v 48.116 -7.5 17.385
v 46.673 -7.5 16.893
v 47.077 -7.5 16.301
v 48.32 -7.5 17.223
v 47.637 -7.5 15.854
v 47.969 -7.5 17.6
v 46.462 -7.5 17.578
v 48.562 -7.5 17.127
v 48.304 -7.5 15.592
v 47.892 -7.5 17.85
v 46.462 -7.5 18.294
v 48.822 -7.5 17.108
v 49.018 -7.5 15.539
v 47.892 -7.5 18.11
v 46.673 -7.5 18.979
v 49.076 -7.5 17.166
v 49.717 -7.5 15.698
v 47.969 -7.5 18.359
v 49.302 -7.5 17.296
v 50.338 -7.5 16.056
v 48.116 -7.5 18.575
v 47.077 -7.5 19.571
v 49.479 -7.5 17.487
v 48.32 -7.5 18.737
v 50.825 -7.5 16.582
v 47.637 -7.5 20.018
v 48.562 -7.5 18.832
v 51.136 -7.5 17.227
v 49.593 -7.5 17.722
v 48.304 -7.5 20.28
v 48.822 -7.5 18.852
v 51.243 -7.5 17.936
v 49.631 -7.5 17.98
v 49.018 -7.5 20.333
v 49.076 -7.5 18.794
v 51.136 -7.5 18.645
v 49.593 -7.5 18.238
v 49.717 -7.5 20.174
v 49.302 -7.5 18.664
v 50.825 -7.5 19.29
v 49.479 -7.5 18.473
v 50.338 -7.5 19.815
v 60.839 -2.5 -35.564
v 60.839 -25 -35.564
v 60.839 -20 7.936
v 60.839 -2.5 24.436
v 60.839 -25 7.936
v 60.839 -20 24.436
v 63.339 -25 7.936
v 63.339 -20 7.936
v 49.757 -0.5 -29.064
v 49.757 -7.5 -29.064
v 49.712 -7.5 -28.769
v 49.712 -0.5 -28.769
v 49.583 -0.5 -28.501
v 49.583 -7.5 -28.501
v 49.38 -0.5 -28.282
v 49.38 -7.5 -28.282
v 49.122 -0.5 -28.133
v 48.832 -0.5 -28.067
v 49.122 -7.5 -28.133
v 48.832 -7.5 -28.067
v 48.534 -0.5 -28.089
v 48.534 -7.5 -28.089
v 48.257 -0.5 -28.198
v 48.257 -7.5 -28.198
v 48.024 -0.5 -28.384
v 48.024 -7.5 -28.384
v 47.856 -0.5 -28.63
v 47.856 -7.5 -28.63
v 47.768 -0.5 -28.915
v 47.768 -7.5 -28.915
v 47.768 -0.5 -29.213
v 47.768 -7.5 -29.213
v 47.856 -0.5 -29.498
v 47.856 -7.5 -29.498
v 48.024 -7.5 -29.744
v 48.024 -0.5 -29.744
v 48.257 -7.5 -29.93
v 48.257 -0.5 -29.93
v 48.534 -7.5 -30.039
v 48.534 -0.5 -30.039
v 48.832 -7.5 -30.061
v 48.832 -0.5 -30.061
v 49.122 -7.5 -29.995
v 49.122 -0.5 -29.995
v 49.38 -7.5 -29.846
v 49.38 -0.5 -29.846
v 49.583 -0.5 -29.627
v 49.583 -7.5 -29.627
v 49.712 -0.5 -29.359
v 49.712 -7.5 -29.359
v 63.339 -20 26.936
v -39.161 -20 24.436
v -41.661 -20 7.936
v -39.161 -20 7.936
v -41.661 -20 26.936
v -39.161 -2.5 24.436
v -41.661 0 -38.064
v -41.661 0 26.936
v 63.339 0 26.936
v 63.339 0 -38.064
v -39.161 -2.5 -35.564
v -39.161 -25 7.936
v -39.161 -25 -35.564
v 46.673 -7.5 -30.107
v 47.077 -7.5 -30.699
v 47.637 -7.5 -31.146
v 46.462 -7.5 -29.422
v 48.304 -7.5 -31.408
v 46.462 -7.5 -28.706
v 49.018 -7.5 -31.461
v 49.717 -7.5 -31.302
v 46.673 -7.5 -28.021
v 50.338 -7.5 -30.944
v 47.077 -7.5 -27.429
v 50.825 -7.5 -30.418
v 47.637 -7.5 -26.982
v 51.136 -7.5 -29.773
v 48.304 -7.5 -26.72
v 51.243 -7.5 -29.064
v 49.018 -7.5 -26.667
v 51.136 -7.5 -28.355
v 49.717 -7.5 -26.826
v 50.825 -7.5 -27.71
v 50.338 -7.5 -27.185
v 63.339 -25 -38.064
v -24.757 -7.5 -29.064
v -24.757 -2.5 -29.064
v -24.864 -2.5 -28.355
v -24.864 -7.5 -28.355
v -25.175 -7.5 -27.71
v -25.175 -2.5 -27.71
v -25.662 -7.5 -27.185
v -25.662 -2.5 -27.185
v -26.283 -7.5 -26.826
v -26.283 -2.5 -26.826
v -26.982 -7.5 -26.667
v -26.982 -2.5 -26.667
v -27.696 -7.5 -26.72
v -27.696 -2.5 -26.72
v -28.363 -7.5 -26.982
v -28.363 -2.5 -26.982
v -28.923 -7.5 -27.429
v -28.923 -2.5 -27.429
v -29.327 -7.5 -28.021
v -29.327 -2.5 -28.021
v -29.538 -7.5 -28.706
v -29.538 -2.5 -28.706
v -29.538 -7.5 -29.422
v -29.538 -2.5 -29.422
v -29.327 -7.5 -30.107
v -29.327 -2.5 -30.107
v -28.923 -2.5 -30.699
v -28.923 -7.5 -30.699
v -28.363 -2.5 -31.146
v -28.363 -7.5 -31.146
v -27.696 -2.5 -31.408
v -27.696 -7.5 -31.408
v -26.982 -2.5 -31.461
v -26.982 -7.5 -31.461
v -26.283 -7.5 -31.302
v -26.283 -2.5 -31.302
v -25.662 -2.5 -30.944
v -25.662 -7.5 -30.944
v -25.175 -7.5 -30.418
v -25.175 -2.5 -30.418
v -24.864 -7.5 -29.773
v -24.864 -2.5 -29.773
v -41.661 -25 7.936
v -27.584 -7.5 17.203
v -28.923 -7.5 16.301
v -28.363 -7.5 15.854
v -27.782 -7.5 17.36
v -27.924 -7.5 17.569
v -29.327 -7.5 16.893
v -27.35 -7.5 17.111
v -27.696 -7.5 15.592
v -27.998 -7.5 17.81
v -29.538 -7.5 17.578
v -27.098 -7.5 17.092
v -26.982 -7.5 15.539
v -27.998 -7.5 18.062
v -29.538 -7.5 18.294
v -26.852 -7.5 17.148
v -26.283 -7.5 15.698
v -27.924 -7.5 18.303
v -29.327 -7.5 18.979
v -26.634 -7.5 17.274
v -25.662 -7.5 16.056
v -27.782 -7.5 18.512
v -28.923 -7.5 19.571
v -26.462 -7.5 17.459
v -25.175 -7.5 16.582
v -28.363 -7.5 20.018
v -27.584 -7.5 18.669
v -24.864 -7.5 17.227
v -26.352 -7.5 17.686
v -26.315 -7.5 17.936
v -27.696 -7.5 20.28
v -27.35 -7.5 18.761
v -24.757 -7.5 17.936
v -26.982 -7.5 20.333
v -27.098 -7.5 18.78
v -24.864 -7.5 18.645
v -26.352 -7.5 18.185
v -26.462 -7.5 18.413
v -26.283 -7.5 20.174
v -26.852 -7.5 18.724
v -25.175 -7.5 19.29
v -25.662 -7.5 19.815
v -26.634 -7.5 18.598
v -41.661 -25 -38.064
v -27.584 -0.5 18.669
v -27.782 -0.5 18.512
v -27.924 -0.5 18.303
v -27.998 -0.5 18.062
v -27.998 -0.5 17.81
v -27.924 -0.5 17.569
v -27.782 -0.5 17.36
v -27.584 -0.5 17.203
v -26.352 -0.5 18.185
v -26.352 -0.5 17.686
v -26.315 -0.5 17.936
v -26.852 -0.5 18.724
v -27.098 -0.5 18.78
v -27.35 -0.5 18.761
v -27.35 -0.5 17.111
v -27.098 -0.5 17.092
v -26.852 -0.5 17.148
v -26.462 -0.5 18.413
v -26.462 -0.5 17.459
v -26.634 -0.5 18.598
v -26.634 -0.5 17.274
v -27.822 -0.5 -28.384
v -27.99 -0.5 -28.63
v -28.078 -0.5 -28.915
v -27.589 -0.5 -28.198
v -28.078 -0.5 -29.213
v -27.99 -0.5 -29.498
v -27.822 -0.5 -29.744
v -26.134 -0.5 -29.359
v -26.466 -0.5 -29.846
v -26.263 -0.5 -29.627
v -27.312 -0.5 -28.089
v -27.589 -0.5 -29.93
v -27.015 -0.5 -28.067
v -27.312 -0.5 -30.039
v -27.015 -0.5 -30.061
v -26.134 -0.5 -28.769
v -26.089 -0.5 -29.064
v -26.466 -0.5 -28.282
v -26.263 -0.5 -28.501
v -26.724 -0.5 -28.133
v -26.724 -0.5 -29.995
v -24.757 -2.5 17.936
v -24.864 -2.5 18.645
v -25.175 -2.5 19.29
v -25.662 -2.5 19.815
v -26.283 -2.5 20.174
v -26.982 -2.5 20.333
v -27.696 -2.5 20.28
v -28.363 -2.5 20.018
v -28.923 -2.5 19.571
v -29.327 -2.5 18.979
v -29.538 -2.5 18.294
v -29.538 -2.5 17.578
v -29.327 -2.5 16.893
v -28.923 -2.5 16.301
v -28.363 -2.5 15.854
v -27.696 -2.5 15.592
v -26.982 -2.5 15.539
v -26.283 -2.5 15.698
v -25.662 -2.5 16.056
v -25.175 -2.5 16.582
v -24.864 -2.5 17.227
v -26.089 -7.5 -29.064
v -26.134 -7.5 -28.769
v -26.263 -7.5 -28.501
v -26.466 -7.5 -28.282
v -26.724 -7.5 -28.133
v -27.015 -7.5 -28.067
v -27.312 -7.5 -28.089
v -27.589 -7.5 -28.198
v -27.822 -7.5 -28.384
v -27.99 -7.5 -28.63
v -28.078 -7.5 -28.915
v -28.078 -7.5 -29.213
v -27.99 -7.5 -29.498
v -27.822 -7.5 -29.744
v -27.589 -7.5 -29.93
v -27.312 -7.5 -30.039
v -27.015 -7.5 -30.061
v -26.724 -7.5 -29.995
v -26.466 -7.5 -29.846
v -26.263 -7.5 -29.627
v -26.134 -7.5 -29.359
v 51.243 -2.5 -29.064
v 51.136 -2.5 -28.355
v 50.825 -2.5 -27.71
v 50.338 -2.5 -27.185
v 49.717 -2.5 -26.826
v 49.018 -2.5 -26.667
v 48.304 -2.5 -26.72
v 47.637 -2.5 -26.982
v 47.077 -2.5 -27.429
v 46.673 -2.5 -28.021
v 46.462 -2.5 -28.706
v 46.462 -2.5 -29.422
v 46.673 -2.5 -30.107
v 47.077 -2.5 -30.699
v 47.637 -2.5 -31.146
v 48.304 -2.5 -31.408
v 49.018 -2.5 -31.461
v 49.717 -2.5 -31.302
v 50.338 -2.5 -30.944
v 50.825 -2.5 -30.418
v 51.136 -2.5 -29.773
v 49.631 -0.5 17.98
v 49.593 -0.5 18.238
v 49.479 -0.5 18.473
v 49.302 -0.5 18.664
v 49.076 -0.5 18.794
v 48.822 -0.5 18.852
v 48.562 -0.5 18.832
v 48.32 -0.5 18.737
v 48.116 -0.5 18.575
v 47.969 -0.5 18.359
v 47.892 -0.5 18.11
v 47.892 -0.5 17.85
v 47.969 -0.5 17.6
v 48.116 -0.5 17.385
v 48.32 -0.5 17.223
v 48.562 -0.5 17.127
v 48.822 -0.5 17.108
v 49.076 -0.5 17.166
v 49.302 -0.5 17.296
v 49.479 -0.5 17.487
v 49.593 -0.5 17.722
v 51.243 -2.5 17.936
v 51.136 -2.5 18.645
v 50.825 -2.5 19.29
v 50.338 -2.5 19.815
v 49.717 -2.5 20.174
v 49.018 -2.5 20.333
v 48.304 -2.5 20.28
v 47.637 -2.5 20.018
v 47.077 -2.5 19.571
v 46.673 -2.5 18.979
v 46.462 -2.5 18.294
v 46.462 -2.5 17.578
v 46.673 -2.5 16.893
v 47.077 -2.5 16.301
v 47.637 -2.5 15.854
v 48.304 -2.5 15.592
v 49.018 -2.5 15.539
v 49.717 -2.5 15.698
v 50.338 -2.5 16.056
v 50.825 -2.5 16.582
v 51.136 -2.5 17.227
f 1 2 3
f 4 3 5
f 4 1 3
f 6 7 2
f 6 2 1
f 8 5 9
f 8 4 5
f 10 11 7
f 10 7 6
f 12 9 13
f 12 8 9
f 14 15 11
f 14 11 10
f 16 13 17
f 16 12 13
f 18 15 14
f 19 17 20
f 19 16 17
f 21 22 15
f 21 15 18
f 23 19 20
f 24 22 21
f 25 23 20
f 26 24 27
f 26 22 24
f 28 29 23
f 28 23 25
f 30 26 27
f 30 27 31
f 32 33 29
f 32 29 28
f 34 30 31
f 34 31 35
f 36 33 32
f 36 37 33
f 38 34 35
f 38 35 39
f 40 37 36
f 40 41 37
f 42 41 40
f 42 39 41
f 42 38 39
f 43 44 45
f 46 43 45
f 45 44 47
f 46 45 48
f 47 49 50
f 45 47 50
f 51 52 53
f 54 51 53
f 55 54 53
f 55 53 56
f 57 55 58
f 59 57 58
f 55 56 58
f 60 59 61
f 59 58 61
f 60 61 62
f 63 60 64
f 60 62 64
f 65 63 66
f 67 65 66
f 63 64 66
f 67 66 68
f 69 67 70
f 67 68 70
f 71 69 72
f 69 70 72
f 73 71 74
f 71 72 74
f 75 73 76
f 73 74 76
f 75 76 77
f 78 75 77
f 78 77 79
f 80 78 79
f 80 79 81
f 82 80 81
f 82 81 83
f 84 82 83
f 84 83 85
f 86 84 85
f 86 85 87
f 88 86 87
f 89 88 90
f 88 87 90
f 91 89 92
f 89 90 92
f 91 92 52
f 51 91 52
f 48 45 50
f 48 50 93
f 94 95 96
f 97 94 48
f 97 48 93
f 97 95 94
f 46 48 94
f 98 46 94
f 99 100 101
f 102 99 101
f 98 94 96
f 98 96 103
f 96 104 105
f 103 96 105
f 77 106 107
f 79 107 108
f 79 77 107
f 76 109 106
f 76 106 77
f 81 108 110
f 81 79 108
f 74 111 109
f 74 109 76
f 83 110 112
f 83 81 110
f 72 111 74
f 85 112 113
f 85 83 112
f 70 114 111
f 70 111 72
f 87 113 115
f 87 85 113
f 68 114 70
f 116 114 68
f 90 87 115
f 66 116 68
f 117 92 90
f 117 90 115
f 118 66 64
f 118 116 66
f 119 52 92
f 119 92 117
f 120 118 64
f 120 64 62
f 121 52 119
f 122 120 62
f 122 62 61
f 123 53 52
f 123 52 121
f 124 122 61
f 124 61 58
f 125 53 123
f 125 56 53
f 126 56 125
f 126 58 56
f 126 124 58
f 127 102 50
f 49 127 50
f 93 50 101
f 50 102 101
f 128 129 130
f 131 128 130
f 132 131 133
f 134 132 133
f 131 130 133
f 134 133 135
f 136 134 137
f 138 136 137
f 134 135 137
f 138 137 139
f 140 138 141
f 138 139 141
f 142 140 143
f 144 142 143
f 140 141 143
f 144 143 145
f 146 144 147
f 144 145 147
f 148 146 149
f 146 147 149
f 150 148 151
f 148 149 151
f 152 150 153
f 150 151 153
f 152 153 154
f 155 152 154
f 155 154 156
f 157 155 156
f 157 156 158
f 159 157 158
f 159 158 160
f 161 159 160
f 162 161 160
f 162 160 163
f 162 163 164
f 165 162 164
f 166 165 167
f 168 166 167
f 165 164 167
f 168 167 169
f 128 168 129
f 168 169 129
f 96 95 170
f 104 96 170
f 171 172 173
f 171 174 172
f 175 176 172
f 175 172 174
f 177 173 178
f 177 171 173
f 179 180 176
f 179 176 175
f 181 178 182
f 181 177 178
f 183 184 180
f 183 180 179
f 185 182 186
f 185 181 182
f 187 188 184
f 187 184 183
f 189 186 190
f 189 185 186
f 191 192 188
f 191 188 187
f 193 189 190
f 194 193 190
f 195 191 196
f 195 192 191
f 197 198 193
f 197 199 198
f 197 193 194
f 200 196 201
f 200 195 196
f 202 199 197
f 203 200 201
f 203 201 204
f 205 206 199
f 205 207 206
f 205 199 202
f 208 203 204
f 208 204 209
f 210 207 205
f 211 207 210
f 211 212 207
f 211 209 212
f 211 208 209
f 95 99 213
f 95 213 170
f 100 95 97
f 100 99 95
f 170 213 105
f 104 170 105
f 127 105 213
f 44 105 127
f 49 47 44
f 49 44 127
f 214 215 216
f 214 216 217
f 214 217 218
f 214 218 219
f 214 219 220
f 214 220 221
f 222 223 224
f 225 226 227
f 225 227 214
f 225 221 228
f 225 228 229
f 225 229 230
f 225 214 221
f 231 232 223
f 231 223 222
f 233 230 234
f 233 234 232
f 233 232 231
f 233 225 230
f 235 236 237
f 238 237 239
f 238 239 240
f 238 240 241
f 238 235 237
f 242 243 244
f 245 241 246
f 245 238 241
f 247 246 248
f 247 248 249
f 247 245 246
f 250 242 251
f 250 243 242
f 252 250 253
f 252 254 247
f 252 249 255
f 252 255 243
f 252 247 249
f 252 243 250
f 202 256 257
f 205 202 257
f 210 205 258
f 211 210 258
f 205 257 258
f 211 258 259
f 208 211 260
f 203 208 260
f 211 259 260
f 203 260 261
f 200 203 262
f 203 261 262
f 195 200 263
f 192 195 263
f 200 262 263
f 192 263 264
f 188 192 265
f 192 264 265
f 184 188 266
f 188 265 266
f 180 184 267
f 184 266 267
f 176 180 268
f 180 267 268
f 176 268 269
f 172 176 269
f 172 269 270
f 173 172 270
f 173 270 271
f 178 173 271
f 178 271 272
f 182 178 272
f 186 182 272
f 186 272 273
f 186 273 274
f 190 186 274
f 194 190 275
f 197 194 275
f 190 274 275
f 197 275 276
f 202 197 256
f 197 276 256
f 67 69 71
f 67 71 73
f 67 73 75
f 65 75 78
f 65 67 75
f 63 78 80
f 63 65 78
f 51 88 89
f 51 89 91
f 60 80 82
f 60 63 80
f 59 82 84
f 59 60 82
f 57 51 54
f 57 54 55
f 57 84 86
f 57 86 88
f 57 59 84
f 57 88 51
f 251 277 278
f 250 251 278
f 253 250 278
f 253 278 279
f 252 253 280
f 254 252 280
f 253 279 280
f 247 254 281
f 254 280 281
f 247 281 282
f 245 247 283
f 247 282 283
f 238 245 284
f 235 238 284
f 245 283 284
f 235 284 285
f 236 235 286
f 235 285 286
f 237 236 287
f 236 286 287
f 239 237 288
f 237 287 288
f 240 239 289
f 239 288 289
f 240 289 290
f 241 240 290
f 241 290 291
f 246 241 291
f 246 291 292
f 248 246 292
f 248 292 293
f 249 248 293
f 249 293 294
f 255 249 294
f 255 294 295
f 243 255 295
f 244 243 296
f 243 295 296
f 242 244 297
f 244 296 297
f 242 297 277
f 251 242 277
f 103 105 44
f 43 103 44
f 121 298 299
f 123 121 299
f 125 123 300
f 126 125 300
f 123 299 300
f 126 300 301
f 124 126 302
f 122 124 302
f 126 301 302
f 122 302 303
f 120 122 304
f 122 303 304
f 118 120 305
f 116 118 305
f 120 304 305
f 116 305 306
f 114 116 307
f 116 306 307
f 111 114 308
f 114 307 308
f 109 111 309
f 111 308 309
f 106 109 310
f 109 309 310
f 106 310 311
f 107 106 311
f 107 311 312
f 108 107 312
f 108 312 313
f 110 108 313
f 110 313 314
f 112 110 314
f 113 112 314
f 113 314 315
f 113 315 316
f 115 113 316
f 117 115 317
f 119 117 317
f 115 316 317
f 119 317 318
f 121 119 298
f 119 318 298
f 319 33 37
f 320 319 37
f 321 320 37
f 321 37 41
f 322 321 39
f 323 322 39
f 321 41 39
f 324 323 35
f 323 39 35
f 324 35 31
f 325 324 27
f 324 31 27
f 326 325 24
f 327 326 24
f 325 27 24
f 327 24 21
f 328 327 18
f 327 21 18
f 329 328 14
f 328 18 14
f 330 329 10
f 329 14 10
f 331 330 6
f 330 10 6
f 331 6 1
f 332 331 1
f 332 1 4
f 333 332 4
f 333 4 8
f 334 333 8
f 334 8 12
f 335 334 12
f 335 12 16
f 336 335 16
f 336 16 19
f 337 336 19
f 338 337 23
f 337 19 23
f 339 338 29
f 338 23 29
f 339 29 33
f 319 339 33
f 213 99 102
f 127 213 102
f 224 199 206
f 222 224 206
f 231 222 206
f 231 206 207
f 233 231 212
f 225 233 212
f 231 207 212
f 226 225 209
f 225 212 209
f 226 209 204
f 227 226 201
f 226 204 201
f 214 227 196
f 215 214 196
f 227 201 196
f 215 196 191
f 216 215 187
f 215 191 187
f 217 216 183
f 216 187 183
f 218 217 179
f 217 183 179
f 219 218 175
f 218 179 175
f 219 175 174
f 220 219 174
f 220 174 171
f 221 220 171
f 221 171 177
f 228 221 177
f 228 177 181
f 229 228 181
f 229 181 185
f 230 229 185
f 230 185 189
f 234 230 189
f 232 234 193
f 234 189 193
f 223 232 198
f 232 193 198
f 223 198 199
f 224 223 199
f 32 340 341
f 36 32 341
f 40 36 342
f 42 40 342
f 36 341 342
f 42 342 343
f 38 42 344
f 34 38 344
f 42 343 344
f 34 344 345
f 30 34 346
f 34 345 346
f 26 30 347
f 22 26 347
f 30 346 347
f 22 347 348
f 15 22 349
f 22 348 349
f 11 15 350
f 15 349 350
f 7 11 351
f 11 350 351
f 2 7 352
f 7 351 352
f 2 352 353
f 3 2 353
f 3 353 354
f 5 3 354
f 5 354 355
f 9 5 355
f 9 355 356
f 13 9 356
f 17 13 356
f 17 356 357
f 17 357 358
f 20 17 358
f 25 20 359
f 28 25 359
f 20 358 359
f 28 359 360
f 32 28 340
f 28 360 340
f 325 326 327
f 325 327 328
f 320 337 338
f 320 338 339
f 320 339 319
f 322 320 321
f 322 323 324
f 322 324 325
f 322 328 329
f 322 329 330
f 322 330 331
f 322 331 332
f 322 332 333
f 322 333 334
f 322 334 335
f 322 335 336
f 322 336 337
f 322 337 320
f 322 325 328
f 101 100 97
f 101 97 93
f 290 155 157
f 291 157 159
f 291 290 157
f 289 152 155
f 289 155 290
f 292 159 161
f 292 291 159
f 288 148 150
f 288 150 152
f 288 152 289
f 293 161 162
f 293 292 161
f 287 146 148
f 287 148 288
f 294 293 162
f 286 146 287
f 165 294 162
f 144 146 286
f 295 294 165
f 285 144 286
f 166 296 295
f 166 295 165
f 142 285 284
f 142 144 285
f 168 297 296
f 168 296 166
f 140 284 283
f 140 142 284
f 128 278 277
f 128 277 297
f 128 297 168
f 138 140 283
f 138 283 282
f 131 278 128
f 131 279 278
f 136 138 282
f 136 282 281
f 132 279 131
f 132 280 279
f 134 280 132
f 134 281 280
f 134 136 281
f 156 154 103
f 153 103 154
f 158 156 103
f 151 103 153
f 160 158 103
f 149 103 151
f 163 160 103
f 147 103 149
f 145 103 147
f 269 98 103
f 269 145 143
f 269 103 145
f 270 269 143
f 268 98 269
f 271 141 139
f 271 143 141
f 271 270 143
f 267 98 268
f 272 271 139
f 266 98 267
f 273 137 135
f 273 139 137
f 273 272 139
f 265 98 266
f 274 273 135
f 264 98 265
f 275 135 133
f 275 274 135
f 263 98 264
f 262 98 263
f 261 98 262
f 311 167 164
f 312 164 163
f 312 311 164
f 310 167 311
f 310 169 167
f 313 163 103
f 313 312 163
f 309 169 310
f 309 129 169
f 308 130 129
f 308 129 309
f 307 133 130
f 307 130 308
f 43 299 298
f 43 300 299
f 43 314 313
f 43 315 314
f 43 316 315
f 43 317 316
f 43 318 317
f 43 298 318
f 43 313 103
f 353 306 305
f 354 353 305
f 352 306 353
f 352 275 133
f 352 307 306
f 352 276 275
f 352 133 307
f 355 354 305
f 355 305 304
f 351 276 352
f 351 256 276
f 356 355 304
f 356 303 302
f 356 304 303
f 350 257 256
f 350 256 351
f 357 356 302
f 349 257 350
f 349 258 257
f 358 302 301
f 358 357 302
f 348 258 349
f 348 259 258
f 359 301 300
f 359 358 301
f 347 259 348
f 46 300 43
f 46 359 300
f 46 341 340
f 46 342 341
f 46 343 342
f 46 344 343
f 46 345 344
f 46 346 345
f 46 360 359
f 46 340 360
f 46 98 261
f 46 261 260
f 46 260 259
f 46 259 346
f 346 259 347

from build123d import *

# Parameters (mm, degrees)
F0_W      = 105
F0_H      = 65
F1_DEPTH  = 25
F3_DEPTH  = 22.5
F4_W      = 5
F4_H      = 19
F5_DEPTH  = 2.5
F6_W      = 5
F6_H      = 19
F7_DEPTH  = 2.5
F9_DEPTH  = 2.5
F10_R     = 2.403973
F11_DEPTH = 5
F12_R     = 0.874474
F12_R_2   = 0.999999
F12_R_3   = 0.846332
F12_R_4   = 1
F13_DEPTH = 7


with BuildPart() as f1:
    # F0 (on Front) → F1 (new body)
    with BuildSketch(Plane.XZ):
        with Locations((10.83879, -5.564056)):
            Rectangle(F0_W, F0_H)
    extrude(amount=F1_DEPTH)

    # F2 (on face) → F3 (cut)
    with BuildSketch(Plane.XZ.offset(25)):
        Polygon((12.475623, 24.435944), (-39.16121, 24.435944), (-39.16121, -11.767991), (-39.16121, -35.564056), (11.927005, -35.564056), (60.83879, -35.564056), (60.83879, -26.717814), (60.83879, 24.435944), align=None)
    extrude(amount=-F3_DEPTH, mode=Mode.SUBTRACT)

    # F4 (on face) → F5 (cut)
    with BuildSketch(Plane(origin=(-41.66121, 0, 0), x_dir=(0, -1, 0), z_dir=(-1, 0, 0))):
        with Locations((22.5, 17.435944)):
            Rectangle(F4_W, F4_H)
    extrude(amount=-F5_DEPTH, mode=Mode.SUBTRACT)

    # F6 (on face) → F7 (cut)
    with BuildSketch(Plane.YZ.offset(63.33879)):
        with Locations((-22.5, 17.435944)):
            Rectangle(F6_W, F6_H)
    extrude(amount=-F7_DEPTH, mode=Mode.SUBTRACT)

    # F8 (on face) → F9 (cut)
    with BuildSketch(Plane.XY.offset(26.935944)):
        Polygon((-39.16121, -20), (-39.16121, -22.5), (-39.16121, -25), (60.83879, -25), (60.83879, -20), align=None)
    extrude(amount=-F9_DEPTH, mode=Mode.SUBTRACT)

    # F10 (on face) → F11 (join)
    with BuildSketch(Plane.XZ.offset(2.5)):
        with Locations((48.83879, 17.935944)):
            Circle(F10_R)
        with Locations((-27.16121, -29.064056)):
            Circle(F10_R)
        with Locations((48.83879, -29.064056)):
            Circle(F10_R)
        with Locations((-27.16121, 17.935944)):
            Circle(F10_R)
    extrude(amount=F11_DEPTH)

    # F12 (on face) → F13 (cut)
    with BuildSketch(Plane.XZ.offset(7.5)):
        with Locations((48.756924, 17.979905)):
            Circle(F12_R)
        with Locations((48.756924, -29.064033)):
            Circle(F12_R_2)
        with Locations((-27.16121, 17.935944)):
            Circle(F12_R_3)
        with Locations((-27.089426, -29.064033)):
            Circle(F12_R_4)
    extrude(amount=-F13_DEPTH, mode=Mode.SUBTRACT)


solid = f1.part
